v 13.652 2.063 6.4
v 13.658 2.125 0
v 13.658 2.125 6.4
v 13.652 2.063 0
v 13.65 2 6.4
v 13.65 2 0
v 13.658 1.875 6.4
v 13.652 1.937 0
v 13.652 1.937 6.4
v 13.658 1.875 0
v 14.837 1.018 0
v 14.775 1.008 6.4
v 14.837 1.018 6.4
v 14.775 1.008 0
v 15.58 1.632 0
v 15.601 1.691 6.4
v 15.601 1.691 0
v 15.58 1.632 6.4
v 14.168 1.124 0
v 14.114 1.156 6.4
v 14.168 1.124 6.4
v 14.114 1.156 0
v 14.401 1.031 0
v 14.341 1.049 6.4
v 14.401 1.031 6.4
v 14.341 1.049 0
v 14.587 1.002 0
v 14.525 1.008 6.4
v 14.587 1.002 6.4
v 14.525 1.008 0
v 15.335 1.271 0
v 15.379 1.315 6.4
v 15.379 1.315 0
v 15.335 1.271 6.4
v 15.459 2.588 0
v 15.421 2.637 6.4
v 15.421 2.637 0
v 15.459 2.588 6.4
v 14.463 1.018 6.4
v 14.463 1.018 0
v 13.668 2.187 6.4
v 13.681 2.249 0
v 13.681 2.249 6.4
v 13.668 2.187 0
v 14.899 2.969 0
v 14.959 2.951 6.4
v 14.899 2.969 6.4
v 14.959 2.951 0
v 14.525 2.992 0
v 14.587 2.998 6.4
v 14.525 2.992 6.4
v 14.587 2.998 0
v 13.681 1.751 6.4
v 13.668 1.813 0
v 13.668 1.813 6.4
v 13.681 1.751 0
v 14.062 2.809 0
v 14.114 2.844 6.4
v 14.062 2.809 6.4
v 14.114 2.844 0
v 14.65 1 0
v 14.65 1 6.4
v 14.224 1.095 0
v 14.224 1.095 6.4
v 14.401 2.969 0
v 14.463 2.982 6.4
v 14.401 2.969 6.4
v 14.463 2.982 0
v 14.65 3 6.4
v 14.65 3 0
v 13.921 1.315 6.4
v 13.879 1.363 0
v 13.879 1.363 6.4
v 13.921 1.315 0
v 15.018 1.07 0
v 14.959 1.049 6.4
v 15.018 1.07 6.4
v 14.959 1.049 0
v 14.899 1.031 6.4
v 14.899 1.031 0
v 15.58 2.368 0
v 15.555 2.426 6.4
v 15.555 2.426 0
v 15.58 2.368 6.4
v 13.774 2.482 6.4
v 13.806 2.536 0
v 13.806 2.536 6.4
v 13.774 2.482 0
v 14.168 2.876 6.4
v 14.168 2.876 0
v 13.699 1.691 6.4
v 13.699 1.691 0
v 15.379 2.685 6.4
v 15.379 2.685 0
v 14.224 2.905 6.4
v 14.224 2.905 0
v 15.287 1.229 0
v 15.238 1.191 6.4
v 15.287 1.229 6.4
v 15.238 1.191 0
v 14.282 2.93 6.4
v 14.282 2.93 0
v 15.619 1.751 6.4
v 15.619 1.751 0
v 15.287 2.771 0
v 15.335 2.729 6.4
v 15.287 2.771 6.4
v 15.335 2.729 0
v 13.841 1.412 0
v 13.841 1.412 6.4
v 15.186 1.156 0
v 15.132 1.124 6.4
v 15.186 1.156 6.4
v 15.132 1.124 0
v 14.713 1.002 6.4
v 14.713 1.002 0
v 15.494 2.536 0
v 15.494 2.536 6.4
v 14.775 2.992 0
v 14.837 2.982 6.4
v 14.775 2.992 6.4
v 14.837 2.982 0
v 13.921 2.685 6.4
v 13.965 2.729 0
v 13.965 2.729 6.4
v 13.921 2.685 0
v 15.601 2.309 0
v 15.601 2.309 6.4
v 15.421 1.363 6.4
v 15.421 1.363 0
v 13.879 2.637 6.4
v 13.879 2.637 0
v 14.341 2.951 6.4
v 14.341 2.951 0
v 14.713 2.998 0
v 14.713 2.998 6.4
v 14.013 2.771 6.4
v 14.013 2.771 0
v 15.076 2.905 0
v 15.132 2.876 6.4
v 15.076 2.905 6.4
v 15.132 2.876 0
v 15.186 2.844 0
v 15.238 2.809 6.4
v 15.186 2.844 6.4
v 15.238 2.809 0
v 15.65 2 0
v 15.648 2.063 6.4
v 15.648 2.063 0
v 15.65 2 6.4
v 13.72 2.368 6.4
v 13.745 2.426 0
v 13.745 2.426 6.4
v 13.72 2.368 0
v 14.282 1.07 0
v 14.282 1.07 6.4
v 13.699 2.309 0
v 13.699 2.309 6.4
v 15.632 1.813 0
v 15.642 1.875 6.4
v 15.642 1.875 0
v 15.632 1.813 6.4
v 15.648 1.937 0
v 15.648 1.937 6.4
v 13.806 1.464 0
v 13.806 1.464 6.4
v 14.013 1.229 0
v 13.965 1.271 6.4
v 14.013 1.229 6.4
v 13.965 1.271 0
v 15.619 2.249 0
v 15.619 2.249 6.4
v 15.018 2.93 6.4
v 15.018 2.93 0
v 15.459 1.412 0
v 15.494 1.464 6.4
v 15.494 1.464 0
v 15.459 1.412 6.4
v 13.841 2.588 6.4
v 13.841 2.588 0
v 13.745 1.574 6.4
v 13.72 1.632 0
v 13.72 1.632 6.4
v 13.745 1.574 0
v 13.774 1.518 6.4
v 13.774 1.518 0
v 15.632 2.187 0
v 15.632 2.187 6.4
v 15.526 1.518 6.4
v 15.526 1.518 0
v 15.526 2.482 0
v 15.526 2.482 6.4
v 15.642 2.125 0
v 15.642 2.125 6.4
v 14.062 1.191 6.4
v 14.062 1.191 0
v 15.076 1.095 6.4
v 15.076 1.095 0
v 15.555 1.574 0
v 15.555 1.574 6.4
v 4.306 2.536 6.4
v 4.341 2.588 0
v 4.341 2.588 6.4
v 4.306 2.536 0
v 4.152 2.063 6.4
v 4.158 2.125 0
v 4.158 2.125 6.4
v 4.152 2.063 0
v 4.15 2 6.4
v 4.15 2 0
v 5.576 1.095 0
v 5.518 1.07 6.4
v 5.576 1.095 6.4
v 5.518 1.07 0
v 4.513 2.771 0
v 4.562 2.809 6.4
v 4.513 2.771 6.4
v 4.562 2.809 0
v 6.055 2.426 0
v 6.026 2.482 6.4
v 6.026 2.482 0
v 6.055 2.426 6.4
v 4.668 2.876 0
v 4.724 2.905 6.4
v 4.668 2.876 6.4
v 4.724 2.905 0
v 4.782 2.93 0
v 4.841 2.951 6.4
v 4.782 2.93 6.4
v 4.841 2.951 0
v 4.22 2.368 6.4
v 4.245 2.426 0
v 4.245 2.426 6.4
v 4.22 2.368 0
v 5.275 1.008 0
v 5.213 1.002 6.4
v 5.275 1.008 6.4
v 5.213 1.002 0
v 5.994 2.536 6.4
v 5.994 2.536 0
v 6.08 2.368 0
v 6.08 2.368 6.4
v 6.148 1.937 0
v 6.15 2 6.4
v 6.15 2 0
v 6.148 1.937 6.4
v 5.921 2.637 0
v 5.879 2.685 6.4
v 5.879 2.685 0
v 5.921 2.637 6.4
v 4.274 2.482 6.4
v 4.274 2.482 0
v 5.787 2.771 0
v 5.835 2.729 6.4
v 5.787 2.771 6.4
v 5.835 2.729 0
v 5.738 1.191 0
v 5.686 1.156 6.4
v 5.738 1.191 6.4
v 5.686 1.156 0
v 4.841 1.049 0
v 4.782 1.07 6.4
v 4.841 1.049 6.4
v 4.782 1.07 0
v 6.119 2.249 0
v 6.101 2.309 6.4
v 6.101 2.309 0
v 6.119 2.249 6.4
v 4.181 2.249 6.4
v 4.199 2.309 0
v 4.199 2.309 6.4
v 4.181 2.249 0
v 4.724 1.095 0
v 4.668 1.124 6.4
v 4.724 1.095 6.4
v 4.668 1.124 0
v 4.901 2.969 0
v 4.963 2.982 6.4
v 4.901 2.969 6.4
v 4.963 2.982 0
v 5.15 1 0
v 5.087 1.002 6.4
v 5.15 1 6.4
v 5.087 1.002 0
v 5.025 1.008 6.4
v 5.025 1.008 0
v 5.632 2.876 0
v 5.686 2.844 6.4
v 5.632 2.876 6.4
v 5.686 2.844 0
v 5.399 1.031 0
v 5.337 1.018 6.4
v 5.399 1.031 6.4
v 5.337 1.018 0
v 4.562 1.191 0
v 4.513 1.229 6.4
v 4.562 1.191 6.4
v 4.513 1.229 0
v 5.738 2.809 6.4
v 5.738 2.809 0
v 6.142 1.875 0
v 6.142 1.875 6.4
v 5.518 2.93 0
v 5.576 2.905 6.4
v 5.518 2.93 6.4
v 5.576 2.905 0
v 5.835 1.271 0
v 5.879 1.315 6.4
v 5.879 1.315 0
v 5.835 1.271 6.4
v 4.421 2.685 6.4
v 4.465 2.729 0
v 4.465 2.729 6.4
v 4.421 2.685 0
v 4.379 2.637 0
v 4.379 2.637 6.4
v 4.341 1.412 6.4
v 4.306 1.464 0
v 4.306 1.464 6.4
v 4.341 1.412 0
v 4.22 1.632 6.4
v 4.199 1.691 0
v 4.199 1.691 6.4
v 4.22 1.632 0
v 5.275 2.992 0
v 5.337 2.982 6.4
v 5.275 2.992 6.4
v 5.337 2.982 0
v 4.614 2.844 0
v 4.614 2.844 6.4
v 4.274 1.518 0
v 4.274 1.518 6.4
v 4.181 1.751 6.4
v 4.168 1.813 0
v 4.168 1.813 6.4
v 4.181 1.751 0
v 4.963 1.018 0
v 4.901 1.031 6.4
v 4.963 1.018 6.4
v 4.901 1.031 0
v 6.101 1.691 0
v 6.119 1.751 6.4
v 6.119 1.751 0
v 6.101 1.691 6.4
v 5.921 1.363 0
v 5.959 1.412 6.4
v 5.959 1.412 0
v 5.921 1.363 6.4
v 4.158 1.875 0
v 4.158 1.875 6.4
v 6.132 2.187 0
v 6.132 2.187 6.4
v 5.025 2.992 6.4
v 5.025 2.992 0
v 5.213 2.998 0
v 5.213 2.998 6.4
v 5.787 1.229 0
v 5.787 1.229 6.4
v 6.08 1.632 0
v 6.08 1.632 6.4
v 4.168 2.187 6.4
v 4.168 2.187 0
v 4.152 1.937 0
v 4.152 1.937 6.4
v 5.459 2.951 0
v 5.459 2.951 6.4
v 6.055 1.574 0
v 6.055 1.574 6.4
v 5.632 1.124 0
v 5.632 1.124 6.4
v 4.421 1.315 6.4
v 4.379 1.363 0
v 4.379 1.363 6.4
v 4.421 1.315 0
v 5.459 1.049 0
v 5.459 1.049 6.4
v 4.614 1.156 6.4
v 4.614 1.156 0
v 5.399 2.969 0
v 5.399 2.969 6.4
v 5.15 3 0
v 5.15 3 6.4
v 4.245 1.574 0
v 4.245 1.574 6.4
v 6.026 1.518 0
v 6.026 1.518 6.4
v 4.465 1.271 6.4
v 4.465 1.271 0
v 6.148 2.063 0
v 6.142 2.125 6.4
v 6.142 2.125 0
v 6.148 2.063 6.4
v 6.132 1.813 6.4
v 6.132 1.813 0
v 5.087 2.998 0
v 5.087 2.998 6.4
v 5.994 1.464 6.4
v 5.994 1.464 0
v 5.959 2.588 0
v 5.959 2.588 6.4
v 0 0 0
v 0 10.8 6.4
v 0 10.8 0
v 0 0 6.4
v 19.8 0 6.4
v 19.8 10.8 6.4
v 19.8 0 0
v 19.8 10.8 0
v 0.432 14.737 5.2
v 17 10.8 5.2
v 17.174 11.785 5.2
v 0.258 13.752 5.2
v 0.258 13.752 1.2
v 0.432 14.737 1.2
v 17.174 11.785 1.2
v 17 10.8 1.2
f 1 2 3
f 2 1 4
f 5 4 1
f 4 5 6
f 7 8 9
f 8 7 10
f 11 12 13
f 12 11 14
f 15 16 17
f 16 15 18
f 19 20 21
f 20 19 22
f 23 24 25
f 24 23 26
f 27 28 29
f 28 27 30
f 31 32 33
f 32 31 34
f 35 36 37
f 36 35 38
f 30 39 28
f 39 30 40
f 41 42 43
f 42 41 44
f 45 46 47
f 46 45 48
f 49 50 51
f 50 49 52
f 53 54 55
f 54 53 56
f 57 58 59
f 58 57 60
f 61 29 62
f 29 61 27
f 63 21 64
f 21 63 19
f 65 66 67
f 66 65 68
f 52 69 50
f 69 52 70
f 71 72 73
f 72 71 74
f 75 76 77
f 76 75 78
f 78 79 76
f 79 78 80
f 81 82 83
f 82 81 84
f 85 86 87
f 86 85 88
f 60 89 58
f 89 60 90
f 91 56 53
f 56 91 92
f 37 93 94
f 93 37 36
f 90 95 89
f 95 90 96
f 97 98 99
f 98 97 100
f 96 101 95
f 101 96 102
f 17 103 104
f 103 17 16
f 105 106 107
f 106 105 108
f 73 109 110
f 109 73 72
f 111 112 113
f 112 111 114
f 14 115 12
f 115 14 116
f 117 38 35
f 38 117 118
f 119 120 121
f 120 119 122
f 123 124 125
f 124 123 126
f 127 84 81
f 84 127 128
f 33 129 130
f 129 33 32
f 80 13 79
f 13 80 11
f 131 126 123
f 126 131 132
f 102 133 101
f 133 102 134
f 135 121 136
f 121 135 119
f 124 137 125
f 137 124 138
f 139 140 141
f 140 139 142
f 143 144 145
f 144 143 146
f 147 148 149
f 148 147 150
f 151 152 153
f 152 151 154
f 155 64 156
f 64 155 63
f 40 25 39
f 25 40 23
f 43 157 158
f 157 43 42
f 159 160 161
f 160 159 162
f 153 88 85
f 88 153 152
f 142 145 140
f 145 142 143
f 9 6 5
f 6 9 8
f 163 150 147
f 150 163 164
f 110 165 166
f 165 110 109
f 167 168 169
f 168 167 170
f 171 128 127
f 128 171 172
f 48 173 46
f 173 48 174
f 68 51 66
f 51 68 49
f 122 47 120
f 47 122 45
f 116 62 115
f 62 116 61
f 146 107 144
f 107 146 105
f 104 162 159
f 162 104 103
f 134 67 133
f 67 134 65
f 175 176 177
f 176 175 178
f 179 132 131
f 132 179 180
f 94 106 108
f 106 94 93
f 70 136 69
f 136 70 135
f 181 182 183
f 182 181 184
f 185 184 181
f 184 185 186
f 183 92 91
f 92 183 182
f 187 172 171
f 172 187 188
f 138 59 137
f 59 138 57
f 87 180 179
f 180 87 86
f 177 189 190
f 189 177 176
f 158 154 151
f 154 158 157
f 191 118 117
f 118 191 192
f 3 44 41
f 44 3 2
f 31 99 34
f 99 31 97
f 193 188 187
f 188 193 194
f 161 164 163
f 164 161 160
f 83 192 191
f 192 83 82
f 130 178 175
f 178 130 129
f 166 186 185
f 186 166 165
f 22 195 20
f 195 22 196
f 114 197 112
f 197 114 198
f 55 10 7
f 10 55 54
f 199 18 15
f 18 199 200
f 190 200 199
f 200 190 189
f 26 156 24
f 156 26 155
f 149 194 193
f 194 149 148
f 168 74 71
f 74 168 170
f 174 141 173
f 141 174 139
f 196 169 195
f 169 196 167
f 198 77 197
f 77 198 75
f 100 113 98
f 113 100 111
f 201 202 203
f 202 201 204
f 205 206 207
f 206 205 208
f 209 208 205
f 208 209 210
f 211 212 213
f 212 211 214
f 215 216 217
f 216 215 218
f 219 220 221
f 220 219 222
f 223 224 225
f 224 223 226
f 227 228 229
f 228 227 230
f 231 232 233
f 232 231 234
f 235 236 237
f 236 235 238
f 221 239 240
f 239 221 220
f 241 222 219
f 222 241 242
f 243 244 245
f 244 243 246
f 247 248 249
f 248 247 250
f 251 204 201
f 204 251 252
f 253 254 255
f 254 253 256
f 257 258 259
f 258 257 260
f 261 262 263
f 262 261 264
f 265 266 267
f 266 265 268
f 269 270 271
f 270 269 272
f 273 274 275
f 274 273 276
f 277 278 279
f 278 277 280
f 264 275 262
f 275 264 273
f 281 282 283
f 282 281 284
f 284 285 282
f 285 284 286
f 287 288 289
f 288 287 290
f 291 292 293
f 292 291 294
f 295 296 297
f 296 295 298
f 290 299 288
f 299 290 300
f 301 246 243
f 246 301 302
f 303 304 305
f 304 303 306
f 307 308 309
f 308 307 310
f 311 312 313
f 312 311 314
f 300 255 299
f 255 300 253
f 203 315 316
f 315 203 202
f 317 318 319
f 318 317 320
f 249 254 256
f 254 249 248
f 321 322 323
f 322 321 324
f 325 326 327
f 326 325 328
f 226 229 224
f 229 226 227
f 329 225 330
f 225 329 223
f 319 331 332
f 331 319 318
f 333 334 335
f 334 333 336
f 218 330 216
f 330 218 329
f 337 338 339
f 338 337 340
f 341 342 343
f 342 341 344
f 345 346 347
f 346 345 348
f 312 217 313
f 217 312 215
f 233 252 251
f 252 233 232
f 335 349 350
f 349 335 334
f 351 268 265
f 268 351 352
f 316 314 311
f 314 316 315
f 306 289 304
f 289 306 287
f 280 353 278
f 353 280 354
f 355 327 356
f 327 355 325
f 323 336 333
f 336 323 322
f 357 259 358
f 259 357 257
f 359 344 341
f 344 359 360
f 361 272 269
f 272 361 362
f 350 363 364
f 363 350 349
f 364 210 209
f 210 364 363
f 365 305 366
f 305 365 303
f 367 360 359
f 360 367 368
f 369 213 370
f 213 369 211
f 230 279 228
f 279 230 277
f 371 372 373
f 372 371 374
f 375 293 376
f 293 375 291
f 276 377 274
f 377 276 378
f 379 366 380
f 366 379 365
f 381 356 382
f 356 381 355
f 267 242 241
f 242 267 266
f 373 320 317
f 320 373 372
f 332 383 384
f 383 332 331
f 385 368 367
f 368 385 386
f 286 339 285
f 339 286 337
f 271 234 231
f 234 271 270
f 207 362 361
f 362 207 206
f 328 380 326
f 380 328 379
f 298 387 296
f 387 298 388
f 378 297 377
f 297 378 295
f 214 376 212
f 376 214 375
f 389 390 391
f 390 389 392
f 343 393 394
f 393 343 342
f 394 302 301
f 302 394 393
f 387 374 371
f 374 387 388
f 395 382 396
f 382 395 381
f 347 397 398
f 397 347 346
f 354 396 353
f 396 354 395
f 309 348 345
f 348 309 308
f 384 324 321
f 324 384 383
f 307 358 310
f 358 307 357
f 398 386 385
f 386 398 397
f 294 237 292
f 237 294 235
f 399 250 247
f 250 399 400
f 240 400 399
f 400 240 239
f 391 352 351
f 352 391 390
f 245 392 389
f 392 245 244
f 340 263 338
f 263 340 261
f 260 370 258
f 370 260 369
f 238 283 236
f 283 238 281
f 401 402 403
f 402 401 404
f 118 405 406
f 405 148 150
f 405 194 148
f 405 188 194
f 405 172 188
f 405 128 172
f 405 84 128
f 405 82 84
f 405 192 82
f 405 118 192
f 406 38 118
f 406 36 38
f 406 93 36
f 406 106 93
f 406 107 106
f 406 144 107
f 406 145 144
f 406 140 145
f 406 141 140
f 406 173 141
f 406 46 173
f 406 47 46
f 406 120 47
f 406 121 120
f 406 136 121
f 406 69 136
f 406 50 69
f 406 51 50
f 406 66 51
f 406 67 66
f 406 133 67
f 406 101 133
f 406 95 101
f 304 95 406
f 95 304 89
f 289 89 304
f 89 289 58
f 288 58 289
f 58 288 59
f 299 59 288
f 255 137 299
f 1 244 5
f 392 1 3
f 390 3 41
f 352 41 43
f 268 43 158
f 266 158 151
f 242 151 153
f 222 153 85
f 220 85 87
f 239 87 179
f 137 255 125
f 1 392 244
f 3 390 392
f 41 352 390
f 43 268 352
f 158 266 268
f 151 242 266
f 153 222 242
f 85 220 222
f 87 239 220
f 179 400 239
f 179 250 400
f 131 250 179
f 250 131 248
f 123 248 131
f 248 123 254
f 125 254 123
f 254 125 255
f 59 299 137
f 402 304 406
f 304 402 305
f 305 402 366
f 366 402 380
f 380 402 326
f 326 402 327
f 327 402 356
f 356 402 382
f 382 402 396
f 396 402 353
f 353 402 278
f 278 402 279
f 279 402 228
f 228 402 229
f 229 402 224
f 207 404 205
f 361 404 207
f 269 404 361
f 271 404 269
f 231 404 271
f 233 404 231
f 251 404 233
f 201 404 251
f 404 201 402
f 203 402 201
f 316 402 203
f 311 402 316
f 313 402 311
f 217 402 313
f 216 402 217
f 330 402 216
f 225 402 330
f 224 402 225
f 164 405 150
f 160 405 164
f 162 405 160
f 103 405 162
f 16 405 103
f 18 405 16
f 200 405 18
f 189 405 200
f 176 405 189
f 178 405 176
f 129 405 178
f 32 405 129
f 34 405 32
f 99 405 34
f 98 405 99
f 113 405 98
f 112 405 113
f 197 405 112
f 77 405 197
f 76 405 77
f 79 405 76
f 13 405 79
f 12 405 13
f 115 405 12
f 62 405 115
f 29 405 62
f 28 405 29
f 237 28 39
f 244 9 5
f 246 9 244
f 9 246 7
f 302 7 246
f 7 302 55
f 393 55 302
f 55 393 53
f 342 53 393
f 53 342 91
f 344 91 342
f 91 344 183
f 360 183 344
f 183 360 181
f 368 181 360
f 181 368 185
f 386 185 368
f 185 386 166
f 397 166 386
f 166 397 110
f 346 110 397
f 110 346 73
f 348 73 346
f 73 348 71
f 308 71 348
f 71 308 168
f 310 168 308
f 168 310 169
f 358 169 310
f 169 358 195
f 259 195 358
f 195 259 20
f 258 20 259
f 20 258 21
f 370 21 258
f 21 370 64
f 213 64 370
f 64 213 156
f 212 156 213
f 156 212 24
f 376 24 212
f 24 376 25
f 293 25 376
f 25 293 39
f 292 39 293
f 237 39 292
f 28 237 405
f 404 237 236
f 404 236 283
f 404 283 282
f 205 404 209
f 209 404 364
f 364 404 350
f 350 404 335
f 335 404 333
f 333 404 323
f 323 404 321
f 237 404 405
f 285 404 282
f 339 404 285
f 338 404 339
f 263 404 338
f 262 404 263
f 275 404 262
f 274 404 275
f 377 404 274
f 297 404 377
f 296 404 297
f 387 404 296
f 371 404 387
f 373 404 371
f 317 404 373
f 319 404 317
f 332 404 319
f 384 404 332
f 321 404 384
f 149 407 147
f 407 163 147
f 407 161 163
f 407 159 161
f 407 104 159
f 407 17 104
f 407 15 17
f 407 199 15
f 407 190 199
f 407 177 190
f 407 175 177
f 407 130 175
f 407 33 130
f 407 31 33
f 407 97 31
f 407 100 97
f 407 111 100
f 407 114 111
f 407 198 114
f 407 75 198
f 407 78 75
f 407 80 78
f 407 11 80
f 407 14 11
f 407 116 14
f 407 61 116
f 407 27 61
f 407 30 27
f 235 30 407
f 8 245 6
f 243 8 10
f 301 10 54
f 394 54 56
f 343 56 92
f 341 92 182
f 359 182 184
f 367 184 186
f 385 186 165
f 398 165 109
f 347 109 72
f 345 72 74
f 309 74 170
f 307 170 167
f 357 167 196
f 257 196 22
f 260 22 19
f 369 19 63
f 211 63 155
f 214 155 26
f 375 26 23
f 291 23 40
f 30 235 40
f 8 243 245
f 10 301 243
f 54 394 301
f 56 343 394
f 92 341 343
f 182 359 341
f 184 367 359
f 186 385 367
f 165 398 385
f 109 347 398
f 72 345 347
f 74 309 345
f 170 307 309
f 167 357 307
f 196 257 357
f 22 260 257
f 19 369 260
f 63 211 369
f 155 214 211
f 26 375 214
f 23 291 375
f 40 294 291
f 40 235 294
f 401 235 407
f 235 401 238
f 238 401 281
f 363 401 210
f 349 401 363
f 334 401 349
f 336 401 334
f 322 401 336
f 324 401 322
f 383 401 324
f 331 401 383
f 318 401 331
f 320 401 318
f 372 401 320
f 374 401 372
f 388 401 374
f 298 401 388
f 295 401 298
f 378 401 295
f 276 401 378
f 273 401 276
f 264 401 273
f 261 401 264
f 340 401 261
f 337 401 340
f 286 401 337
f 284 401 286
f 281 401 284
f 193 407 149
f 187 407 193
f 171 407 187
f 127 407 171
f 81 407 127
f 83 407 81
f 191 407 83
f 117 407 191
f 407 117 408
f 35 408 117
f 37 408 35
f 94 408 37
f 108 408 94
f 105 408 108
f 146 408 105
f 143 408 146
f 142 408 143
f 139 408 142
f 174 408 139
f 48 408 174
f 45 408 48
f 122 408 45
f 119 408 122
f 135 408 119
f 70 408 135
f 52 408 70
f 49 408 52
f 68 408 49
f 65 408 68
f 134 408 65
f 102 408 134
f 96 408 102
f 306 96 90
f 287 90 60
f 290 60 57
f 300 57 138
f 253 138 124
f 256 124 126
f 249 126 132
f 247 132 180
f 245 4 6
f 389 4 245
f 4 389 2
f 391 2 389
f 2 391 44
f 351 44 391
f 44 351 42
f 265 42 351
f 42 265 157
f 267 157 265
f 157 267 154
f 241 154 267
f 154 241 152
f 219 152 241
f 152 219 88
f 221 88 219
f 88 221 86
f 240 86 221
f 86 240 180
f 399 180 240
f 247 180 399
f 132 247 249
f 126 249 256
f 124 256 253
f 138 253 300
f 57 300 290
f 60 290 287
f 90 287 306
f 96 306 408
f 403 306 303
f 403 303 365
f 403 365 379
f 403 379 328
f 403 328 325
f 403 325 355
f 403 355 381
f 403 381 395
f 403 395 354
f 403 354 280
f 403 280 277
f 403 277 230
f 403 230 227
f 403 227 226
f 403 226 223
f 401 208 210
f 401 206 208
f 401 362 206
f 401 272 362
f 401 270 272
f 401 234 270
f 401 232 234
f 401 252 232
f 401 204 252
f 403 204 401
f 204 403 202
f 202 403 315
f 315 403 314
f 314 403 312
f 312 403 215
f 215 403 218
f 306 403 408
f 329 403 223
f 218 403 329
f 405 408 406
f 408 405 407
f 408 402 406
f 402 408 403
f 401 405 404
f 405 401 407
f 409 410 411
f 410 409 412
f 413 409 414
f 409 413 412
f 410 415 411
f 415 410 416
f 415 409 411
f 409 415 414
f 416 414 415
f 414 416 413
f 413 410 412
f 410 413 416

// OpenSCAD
include <MCAD/materials.scad>
include <MCAD/metric_fastners.scad>

module micro_switch(with_extra_parts=false, exploded=false) {
  scale([-1,1,1]) translate([-19.8, 0, 0]){
    difference() {
      color(BlackPaint) cube([19.8, 10.8, 6.4]);

      translate([5.15, 2, 0]) {
        translate([0, 0, -0.5])
          cylinder(h = 7.4, R=2.6, $fn=100);
        translate([9.5, 0, -0.5])
        cylinder(h = 7.4, R=2.6, $fn=100);
      }
    }
    translate([2.8, 10.8, 1.2])
      rotate([0,0,10])
        color(Steel) cube([17,1,4]);

    if(with_extra_parts)
      micro_switch_extras(exploded_distance=(exploded?15:0));
  }

  module micro_switch_extras(exploded_distance=0) {
    screw_size = 2.2;
    screw_length = 13;
    echo("Non-Plastic Parts, 2, Self Tapping Screw 2.2 x 13 mm for micro switch");
    translate([5.15, 2, 0]) color(Steel) {
      translate([0, 0, 0.5+6.4+exploded_distance])
        rotate([180,0,0]) csk_bolt(screw_size, screw_length);
      translate([9.5, 0, 0.5+6.4+exploded_distance])
        rotate([180,0,0]) csk_bolt(screw_size, screw_length);
    }
  }

}


micro_switch();
